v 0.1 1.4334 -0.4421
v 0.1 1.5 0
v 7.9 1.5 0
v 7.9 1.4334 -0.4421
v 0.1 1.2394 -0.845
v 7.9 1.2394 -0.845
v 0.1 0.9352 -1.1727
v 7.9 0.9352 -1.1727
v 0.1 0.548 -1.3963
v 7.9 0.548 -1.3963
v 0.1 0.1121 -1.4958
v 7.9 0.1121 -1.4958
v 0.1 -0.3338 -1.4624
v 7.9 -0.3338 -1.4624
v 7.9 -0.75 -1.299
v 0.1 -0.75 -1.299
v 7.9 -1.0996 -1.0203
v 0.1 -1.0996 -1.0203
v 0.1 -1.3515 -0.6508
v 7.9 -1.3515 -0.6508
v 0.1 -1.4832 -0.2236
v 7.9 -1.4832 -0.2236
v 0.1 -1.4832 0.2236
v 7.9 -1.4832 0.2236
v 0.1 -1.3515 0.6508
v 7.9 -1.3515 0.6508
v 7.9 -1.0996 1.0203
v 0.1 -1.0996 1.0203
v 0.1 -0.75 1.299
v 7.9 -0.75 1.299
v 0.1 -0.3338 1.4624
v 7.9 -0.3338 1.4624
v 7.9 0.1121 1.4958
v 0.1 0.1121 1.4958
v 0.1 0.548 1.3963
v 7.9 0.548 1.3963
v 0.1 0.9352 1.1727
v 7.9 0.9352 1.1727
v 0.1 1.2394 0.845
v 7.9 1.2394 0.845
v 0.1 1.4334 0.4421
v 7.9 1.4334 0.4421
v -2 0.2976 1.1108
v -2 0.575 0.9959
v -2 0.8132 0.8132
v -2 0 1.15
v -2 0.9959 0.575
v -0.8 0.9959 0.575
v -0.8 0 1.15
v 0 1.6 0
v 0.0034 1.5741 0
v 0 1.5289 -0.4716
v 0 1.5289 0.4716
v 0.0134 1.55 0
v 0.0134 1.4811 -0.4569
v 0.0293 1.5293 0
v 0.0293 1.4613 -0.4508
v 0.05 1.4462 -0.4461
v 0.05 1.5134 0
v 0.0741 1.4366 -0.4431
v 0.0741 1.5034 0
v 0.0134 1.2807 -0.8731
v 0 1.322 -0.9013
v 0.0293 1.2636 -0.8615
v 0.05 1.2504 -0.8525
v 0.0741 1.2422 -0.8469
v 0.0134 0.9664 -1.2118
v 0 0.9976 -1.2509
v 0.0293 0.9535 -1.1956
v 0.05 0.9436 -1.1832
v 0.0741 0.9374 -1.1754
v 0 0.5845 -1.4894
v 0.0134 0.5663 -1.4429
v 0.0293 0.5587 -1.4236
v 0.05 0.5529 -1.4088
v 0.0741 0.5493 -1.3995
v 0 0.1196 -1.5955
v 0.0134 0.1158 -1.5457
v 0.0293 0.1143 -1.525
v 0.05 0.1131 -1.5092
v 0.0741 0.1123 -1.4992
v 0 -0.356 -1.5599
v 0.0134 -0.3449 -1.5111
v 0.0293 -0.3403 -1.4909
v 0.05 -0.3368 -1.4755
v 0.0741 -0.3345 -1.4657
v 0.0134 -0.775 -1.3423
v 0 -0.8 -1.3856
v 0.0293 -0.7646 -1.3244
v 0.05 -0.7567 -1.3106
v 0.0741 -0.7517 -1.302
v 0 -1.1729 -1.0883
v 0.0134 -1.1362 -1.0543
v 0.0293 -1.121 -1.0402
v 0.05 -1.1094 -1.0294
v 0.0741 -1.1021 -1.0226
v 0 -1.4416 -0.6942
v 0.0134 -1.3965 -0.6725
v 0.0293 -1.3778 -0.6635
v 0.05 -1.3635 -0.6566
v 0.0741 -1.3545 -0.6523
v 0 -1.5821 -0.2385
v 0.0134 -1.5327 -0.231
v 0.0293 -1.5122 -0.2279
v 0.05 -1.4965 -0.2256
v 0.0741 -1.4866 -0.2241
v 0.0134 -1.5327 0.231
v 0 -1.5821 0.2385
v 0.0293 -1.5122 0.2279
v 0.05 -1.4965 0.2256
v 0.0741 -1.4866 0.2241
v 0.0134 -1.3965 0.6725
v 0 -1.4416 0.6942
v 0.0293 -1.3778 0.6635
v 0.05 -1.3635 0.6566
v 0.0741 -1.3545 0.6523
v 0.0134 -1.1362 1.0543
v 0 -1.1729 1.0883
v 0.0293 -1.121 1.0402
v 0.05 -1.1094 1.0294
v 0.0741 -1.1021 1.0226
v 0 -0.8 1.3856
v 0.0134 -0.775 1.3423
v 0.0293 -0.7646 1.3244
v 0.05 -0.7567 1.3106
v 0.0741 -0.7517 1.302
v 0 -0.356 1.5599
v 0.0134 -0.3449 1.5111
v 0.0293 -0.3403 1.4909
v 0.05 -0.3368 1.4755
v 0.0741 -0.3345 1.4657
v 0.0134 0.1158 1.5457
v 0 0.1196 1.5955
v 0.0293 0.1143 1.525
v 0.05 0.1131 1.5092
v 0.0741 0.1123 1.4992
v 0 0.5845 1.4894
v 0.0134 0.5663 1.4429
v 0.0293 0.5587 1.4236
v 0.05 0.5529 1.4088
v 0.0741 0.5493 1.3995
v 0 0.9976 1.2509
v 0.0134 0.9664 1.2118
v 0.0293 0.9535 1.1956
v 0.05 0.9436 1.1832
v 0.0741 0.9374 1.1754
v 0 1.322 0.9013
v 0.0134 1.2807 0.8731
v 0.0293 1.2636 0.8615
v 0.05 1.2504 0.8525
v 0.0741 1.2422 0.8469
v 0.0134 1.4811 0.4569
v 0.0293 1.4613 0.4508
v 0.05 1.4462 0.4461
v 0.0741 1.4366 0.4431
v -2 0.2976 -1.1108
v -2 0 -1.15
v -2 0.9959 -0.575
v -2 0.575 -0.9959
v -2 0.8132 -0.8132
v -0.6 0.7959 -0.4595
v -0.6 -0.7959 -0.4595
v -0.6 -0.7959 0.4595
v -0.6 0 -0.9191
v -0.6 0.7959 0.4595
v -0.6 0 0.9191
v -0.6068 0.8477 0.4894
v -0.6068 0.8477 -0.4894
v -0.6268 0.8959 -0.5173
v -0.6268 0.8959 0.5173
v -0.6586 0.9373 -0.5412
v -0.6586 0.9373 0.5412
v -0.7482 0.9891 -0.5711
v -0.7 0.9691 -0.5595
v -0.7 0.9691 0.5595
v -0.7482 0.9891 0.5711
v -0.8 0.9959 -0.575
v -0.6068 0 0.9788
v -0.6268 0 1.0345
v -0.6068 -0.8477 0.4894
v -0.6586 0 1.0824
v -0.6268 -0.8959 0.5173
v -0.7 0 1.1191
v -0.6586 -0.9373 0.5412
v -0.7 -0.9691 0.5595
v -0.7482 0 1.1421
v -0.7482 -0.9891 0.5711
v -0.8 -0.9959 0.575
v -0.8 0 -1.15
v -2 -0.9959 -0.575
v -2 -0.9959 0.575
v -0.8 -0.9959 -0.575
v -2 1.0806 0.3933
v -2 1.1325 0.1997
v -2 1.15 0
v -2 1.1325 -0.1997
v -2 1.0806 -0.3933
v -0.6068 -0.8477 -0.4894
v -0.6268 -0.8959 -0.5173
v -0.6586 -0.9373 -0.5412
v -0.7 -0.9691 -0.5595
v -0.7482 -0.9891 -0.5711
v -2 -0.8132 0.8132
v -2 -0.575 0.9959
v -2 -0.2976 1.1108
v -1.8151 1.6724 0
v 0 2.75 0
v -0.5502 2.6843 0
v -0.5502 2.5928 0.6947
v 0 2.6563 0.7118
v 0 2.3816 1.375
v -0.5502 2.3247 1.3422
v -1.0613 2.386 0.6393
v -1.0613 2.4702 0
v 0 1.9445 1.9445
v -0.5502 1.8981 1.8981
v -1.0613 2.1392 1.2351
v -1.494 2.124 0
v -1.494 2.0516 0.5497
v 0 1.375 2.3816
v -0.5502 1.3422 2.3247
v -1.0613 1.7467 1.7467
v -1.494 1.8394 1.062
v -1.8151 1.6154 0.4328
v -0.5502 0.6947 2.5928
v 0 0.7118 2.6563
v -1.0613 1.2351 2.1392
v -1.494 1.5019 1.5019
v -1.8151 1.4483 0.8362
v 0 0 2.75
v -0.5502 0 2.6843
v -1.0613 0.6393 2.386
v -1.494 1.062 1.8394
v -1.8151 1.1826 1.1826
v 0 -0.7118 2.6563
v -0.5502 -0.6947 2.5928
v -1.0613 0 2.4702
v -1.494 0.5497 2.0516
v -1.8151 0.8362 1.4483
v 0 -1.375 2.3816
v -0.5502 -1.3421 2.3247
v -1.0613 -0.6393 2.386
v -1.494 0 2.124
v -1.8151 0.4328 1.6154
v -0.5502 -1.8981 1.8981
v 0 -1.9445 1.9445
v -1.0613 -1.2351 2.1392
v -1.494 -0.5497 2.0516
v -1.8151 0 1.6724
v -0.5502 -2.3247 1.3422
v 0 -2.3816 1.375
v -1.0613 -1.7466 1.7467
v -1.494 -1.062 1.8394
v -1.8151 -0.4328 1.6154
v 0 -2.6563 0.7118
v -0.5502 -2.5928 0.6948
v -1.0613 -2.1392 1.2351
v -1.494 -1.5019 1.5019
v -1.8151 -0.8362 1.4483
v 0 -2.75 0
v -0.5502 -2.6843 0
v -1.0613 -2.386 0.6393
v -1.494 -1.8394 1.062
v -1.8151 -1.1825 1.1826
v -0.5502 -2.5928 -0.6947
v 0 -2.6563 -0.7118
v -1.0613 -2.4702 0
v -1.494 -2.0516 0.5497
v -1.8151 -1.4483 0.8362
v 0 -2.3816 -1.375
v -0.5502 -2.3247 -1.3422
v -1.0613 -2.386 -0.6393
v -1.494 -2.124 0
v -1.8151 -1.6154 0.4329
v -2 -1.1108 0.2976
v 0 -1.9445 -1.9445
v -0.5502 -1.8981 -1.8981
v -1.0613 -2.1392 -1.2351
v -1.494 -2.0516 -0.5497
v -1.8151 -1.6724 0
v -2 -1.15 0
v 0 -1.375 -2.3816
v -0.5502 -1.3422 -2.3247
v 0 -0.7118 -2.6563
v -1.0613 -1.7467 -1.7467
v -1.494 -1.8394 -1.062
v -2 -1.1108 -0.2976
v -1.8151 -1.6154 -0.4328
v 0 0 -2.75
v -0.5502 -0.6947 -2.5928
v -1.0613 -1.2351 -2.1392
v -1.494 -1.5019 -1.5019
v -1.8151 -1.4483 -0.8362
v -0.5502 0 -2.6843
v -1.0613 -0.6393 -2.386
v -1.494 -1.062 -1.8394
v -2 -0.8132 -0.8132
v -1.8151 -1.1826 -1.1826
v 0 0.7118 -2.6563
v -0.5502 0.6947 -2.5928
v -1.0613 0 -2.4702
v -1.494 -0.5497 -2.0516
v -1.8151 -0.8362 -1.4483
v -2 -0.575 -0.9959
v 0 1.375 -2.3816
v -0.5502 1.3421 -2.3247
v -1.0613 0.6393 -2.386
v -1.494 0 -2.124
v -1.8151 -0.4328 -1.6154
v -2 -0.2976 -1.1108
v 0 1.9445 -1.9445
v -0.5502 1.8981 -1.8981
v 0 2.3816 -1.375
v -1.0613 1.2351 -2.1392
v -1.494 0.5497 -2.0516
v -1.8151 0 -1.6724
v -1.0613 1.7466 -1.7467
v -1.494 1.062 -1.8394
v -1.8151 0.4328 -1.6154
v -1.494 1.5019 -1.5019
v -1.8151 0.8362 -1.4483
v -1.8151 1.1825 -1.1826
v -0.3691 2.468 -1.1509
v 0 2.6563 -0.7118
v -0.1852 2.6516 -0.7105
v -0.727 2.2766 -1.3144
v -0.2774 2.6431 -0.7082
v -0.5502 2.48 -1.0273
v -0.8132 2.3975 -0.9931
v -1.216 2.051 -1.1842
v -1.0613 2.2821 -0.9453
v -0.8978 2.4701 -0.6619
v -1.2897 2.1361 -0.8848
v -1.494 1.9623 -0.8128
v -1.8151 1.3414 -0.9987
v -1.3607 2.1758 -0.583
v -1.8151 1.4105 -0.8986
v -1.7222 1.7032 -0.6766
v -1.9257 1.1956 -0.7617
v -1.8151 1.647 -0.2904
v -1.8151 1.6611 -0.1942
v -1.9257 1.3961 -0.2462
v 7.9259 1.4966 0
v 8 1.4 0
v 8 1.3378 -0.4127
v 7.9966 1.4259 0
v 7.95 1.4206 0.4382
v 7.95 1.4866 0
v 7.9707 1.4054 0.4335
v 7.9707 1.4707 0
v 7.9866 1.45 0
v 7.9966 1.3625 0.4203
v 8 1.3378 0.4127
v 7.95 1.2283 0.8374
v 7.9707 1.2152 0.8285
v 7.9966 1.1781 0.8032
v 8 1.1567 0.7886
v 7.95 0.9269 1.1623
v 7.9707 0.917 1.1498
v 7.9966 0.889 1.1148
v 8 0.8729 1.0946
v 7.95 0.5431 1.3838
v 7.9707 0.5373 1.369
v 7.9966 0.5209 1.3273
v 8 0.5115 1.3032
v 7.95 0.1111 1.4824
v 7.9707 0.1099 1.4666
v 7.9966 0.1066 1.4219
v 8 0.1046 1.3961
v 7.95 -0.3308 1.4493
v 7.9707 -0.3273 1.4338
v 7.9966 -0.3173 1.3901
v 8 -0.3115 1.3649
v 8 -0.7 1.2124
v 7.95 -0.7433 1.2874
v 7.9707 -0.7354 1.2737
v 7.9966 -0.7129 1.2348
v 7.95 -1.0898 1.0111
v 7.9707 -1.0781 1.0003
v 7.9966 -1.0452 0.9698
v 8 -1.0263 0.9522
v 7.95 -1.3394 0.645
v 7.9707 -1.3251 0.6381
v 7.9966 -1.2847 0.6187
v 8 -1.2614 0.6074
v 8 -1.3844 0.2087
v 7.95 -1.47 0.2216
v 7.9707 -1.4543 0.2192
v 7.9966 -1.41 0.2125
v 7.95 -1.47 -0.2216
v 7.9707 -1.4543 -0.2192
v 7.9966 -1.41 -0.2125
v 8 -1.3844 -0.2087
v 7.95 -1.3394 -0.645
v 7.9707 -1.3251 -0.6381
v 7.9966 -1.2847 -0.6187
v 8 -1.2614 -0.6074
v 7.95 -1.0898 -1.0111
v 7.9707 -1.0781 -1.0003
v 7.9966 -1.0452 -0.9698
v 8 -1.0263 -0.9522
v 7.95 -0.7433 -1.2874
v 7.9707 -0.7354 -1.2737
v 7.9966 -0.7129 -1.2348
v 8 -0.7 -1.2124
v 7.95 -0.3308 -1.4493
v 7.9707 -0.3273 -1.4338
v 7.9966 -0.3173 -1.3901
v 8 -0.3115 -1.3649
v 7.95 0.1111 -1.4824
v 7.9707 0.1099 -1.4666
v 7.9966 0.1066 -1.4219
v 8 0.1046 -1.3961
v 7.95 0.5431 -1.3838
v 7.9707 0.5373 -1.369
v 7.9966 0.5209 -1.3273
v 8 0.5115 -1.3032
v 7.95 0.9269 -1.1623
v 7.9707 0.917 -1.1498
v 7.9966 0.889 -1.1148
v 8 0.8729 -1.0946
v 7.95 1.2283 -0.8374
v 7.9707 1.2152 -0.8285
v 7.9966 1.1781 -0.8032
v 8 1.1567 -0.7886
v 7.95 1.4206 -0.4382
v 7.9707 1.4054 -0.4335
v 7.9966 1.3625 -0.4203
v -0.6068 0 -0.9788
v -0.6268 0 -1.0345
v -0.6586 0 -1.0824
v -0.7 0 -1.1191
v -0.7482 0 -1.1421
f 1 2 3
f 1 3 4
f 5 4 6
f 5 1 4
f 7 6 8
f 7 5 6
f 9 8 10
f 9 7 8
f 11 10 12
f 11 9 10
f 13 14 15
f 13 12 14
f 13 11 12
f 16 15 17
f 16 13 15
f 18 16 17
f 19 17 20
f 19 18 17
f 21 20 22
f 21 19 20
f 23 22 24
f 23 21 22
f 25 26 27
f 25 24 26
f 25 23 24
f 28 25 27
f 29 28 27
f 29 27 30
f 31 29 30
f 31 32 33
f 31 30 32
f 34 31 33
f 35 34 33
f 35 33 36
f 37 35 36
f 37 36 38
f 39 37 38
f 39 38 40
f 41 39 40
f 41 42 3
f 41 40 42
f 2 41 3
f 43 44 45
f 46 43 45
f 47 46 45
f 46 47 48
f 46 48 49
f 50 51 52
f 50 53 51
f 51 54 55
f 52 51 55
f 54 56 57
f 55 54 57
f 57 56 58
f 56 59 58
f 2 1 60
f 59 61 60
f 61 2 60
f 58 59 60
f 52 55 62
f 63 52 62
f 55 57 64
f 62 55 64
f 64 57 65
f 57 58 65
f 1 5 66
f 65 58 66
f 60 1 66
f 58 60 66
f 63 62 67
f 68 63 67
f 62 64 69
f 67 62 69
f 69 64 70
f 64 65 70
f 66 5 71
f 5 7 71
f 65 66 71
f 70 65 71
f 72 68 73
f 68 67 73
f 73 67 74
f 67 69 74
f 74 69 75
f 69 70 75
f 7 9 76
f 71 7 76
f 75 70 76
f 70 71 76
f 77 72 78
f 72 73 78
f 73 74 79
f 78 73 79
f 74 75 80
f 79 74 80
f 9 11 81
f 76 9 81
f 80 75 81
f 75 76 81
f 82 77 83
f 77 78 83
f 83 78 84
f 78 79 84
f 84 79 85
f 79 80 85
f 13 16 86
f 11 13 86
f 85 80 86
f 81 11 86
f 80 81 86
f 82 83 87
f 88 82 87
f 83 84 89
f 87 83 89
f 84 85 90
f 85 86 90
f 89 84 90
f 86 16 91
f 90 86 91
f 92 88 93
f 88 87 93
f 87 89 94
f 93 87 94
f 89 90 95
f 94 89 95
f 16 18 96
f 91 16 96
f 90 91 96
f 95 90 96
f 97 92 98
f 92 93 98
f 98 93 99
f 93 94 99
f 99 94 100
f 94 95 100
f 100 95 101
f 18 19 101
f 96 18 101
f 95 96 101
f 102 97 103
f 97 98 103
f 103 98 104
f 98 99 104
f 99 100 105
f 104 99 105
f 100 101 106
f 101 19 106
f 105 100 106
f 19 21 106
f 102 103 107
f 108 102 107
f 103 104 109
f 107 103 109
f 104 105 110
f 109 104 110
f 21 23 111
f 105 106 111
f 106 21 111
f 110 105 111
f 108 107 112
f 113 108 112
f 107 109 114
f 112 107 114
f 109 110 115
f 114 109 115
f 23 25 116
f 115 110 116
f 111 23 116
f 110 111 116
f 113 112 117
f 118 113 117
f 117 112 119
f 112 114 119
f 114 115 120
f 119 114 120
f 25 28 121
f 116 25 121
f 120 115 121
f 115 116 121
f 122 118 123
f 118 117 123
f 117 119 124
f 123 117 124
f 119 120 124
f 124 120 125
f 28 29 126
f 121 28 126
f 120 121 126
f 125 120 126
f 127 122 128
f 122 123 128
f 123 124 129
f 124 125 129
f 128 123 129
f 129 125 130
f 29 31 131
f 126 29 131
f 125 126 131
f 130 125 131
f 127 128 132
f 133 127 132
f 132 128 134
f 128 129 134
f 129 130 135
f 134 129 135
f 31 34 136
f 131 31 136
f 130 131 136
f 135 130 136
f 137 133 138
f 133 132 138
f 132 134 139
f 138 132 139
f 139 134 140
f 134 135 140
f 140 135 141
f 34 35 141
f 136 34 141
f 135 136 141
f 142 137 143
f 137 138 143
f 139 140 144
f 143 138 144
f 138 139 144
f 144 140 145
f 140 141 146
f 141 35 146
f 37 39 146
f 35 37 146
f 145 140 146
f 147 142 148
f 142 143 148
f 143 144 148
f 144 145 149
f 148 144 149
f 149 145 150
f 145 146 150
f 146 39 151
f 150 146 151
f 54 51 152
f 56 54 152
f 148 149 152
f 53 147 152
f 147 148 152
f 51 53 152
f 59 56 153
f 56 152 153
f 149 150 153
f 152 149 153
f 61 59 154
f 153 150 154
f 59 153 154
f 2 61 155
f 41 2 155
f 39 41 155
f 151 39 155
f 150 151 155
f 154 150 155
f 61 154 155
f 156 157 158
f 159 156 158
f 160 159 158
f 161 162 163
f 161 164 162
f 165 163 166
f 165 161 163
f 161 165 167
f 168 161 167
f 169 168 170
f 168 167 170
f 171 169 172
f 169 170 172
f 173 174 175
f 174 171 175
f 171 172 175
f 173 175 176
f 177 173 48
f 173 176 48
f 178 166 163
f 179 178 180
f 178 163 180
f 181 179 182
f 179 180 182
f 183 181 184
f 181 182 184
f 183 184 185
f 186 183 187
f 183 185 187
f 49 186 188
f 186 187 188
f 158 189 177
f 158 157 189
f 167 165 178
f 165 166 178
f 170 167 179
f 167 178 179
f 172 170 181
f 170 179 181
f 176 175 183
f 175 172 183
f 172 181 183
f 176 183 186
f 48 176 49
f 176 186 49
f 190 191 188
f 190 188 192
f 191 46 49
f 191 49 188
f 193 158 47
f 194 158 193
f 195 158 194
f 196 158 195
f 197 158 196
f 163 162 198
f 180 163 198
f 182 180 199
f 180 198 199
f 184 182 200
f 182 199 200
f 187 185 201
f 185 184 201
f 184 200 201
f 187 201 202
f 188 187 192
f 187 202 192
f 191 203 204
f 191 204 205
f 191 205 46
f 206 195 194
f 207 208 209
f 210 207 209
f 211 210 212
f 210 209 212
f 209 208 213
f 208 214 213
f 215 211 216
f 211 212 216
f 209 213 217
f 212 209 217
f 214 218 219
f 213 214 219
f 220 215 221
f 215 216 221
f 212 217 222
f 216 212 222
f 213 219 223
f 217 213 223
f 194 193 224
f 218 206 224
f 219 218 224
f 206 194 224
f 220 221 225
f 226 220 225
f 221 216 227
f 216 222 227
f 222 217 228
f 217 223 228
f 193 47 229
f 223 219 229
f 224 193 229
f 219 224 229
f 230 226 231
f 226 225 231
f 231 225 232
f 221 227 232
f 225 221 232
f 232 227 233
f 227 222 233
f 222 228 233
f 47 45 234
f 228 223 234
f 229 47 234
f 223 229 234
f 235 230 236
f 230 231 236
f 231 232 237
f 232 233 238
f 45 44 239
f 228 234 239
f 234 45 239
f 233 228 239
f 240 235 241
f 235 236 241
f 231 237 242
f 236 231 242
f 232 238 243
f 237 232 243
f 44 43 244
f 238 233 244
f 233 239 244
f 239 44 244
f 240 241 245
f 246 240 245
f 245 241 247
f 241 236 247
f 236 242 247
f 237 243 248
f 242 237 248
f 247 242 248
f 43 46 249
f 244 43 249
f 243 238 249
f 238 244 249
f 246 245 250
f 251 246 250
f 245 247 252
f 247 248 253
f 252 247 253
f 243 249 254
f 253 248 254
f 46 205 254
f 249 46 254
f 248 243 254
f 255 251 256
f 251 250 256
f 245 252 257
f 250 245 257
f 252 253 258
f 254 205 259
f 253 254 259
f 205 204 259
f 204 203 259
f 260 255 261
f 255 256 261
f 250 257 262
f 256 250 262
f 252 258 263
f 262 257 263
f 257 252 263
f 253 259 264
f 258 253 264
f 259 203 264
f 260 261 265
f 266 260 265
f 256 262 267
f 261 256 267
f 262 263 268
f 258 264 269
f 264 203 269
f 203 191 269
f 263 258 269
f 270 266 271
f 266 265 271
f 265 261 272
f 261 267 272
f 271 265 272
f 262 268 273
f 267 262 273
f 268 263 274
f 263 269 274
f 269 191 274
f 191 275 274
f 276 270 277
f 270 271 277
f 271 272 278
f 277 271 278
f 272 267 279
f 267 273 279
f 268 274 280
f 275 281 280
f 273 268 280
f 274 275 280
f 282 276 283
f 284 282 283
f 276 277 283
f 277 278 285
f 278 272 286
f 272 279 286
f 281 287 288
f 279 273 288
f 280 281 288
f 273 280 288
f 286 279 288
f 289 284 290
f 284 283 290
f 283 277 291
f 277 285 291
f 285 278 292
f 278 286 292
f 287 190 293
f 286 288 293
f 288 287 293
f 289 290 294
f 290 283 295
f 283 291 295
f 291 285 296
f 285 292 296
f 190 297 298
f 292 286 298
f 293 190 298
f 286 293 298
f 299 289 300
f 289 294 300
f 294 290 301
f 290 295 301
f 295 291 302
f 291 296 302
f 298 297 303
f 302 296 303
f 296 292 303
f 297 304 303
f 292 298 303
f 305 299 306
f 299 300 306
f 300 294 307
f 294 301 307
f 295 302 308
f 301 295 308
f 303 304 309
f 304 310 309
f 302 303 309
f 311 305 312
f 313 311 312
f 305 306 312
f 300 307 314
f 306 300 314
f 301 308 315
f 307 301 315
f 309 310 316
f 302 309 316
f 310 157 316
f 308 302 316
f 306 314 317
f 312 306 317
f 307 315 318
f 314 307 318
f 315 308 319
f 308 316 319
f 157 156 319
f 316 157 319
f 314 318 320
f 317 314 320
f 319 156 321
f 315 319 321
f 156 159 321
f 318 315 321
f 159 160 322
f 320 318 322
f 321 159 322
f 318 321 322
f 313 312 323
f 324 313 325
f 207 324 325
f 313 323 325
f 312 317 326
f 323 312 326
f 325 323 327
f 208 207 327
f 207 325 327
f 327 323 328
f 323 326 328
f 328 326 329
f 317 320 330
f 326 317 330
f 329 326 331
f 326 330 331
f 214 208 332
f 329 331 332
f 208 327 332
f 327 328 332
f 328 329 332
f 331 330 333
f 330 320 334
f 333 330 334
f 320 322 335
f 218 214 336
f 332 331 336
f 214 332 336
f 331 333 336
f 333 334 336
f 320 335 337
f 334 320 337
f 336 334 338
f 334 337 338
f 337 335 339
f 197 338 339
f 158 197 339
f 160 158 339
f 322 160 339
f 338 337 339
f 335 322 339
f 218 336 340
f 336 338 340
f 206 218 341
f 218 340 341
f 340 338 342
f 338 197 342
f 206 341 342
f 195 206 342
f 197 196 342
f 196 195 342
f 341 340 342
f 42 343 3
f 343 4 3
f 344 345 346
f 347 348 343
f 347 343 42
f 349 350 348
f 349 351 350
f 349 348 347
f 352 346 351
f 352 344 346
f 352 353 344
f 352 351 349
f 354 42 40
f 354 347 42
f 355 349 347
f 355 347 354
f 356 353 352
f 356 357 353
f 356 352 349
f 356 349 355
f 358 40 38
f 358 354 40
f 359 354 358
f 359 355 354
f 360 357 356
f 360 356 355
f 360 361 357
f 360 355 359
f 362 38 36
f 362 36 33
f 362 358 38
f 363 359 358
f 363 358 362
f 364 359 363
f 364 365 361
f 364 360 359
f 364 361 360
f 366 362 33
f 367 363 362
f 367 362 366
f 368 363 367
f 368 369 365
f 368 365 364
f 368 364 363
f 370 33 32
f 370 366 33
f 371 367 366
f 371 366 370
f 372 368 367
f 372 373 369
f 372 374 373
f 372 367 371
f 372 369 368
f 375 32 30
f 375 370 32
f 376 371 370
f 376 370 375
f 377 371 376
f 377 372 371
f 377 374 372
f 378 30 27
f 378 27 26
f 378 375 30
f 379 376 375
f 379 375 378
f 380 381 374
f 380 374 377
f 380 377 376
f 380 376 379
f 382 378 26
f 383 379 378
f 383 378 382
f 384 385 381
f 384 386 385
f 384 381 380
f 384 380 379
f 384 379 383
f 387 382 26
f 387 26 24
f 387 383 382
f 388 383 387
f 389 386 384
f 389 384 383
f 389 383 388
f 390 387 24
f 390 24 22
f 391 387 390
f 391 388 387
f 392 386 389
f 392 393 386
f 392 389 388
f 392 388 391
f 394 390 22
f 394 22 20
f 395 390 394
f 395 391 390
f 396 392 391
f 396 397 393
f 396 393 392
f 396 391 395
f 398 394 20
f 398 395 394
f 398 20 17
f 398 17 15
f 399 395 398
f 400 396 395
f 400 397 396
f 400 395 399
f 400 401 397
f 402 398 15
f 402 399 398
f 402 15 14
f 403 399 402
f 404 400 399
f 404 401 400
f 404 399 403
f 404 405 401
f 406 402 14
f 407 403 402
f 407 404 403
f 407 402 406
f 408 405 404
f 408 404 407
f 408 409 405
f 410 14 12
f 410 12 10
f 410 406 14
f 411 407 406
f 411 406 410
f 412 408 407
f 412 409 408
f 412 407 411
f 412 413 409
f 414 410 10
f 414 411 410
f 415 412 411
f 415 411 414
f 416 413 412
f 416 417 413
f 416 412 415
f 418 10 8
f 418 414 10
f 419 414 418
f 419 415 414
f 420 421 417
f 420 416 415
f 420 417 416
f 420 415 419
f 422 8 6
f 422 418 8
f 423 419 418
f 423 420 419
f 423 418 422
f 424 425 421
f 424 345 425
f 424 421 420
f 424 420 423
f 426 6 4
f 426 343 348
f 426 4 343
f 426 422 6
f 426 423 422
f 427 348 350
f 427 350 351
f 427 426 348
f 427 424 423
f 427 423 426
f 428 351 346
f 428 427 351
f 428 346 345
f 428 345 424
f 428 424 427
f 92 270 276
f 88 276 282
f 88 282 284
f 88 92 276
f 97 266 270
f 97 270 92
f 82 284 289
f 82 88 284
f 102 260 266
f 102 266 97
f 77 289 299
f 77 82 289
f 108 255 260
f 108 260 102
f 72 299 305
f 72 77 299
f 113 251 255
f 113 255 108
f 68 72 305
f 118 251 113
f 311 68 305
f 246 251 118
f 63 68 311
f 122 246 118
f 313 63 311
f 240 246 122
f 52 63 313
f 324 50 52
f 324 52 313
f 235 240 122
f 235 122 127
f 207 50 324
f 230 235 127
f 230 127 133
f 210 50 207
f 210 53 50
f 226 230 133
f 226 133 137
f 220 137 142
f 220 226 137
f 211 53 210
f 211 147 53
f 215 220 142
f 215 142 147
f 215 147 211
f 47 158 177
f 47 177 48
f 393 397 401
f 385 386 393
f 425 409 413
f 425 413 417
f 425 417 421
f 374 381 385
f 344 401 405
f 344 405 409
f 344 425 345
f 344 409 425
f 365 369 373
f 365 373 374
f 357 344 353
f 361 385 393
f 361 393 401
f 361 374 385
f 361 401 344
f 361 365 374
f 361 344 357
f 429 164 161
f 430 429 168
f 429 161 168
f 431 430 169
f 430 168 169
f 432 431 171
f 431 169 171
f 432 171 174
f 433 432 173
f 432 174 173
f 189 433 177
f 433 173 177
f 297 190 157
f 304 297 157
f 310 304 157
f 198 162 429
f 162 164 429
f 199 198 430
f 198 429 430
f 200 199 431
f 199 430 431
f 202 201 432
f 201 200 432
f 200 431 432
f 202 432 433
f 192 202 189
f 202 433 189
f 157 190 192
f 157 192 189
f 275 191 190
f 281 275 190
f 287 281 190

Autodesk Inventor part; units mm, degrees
ref_plane "YZ Plane" through (0, 0, 0) normal (1, 0, 0) x (0, 1, 0)
ref_plane "XZ Plane" through (0, 0, 0) normal (0, 1, 0) x (-1, 0, 0)
ref_plane "XY Plane" through (0, 0, 0) normal (0, 0, 1) x (1, 0, 0)
sketch "スケッチ1" plane through (0, 0, 0) normal (0, 0, 1) x (1, 0, 0)
  line L0 (0, 0) -> (8, 0)
  line L1 (8, 0) -> (8, 1.5)
  line L2 (8, 1.5) -> (0, 1.5)
  line L3 (0, 1.5) -> (0, 0)
  line L4 (0, 0) -> (0, 2.75)
  line L5 (0, 0) -> (-2, 0)
  line L6 (-2, 0) -> (0, 0)
  line L7 (-2, 0) -> (-2, 1.15)
  arc A0 (0, 2.75) -> (-2, 1.15) centre (-0.0403, 0.7504) ccw
  dimension "d0" = 1.5
  dimension "d1" = 8
  dimension "d3" = 2
  dimension "d4" = 2.75
  dimension "d5" = 1.15
  dimension "d6" = 2
revolve "回転1" add sketch "スケッチ1" angle 360 about axis through (-2, 0, 0) along (1, 0, 0)
thread "ねじ1" size "M3x0.5" class "6g" standard "ANSI Metric M Profile" length 100
sketch "スケッチ2" plane through (-2, 0, 0) normal (-1, 0, 0) x (0, 0, 1)
  circle A0 centre (0, 0) radius 1.15 projected
  line L0 (-0.575, 0.9959) -> (0.575, 0.9959)
  line L1 (0.575, 0.9959) -> (1.15, 0)
  line L2 (1.15, 0) -> (0.575, -0.9959)
  line L3 (0.575, -0.9959) -> (-0.575, -0.9959)
  line L4 (-0.575, -0.9959) -> (-1.15, 0)
  line L5 (-1.15, 0) -> (-0.575, 0.9959)
  dimension "d10" = 1.15
  dimension "d11" = 1.9919
extrude "押し出し1" cut sketch "スケッチ2" against normal blind 1.4 contours L2 L3 L4 L5 L0 L1
fillet "フィレット1" radius 0.2 6 edges at (-0.6, 0.9959, 0) (-0.6, 0.498, 0.8625) (-0.6, 0.498, -0.8625) (-0.6, -0.498, -0.8625) (-0.6, -0.9959, 0) (-0.6, -0.498, 0.8625)
fillet "フィレット2" radius 0.1 1 edges at (0, -1.5, 0)
fillet "フィレット3" radius 0.1 1 edges at (8, -1.5, 0)
properties part number "ネジボタンM3L8" material "鋼"
